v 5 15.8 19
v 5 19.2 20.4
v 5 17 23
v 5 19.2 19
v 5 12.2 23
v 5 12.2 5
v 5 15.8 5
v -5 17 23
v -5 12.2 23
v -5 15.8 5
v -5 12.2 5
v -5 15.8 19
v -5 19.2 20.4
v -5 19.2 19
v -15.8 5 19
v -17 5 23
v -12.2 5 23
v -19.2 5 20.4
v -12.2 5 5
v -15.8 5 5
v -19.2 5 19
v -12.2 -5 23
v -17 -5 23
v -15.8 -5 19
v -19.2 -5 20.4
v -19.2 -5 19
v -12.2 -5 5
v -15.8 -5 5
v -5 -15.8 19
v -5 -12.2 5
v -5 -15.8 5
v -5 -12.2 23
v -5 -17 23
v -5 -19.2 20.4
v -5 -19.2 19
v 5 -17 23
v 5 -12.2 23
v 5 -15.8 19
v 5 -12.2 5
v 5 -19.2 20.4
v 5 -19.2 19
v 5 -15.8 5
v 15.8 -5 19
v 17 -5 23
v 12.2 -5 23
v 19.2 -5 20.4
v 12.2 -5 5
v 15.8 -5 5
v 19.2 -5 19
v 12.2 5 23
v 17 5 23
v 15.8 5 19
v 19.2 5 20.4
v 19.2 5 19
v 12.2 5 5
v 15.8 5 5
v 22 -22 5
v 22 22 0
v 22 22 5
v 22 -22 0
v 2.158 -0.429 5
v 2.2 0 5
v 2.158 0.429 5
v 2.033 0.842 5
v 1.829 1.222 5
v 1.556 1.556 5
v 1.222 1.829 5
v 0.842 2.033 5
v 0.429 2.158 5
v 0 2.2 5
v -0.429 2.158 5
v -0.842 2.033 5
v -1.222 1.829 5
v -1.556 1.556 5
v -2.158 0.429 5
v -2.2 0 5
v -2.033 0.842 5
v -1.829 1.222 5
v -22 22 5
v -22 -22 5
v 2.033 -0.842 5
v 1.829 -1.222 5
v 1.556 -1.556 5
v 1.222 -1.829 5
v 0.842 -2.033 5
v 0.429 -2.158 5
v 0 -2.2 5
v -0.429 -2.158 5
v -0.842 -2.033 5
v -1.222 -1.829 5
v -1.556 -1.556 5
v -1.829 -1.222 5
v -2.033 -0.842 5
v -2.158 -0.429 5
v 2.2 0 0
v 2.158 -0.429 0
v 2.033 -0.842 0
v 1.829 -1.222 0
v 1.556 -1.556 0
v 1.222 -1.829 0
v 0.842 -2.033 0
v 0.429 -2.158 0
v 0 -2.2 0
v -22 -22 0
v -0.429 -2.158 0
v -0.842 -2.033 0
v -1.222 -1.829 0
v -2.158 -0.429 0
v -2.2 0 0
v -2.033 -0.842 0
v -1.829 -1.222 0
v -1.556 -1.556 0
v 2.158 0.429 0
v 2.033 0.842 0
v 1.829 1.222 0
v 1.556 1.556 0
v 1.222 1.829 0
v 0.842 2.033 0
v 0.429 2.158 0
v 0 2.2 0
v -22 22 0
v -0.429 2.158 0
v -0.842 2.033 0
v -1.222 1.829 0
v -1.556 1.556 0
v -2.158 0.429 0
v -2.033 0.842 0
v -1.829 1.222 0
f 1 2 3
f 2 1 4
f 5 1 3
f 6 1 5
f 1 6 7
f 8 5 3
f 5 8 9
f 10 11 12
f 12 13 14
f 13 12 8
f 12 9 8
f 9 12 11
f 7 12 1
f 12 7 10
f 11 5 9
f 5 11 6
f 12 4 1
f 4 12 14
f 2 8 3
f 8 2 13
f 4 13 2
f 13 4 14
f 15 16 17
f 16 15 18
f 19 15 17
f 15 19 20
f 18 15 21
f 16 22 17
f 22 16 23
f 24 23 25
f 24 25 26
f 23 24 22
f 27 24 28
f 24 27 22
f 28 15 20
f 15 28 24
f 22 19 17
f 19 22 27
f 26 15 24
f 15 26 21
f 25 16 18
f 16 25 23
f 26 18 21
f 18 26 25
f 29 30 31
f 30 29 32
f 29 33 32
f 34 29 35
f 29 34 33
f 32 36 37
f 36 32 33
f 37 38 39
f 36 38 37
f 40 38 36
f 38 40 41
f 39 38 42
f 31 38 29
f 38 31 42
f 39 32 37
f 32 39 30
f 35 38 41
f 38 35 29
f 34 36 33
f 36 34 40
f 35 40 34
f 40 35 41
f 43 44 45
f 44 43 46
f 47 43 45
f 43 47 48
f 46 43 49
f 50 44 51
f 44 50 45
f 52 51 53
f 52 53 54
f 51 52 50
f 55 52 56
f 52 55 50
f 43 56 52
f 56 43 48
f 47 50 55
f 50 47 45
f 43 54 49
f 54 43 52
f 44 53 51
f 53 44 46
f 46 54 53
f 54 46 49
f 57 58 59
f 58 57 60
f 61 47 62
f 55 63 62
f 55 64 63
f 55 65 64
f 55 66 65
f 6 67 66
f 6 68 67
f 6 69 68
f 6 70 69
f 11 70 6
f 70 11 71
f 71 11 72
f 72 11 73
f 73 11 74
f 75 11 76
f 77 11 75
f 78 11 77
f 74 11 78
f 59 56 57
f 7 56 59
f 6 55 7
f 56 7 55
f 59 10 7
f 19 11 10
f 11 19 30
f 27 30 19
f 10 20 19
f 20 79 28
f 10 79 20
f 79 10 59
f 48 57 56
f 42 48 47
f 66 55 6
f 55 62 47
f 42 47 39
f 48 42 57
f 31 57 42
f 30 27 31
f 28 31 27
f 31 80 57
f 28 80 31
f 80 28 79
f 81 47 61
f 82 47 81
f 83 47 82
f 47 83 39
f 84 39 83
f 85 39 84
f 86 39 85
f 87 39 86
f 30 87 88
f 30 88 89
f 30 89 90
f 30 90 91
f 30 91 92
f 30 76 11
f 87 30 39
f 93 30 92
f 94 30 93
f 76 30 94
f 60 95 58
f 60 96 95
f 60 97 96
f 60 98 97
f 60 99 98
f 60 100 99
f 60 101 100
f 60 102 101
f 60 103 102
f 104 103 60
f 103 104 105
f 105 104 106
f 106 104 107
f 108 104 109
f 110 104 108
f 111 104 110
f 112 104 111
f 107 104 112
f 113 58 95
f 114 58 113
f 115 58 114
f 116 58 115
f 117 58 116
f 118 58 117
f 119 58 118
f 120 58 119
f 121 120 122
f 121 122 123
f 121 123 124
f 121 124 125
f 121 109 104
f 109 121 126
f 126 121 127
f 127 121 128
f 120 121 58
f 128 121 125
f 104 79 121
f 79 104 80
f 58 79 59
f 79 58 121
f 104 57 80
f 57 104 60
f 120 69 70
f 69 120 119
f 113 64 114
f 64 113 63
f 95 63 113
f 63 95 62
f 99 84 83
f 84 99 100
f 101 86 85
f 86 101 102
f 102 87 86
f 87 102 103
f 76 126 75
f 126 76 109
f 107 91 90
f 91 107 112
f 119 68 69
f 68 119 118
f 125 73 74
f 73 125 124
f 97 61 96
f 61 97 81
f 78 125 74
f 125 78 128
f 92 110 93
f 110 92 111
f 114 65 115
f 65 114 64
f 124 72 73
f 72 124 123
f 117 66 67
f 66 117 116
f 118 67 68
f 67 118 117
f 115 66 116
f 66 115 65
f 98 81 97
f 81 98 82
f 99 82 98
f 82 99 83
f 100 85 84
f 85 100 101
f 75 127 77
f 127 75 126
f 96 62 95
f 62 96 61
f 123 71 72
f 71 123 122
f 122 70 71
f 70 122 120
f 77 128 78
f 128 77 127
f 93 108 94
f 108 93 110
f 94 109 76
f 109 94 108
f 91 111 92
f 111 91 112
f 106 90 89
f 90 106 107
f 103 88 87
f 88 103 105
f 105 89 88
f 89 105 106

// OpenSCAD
$fn = 32;

// ----------------------------------------------------------------------
// Snap-fit latch: 4 arms, 18 mm tall, 3.6 mm undercut hooks
// ----------------------------------------------------------------------

// --- parameters (mm) ---
base_d = 44;              // base plate depth
base_h = 5;               // base plate thickness
span = 28;                // distance between opposite arms
arm_t = 3.6;              // arm thickness
arm_d = 10;               // arm width
height = 18;              // free arm length
head_len = 3.6;           // hook reach
head_h = 4;               // hook height
lead = 1.4;               // lead-in ramp thickness
bore_d = 4.4;             // base fixing bore
top_z = 23;               // height of the arm tips above the base

arms = 4;

difference() {
  union() {
    /* base plate, centred on the arm ring */
    translate([-22, -22, 0]) cube([base_d, base_d, base_h]);
    for (a = [0 : 360 / arms : 359]) rotate([0, 0, a]) {
    /* arm, sunk 0.5 mm into the base */
    translate([-arm_d / 2, span / 2 - arm_t / 2, base_h - 0.5]) cube([arm_d, arm_t, height + 0.5]);
    /* hook: a convex hull of a tall inner block and a thin outer lip
       gives a flat undercut below and a lead-in ramp on top */
    hull() {
      translate([-arm_d / 2, span / 2 + arm_t / 2 - 0.6, top_z - head_h]) cube([arm_d, lead + 0.4, head_h]);
      translate([-arm_d / 2, span / 2 + arm_t / 2 - 0.2, top_z - head_h]) cube([arm_d, head_len, lead]);
    }
    }
  }
  translate([0, 0, -2.5]) cylinder(h = base_h + 5, d = bore_d);
}
